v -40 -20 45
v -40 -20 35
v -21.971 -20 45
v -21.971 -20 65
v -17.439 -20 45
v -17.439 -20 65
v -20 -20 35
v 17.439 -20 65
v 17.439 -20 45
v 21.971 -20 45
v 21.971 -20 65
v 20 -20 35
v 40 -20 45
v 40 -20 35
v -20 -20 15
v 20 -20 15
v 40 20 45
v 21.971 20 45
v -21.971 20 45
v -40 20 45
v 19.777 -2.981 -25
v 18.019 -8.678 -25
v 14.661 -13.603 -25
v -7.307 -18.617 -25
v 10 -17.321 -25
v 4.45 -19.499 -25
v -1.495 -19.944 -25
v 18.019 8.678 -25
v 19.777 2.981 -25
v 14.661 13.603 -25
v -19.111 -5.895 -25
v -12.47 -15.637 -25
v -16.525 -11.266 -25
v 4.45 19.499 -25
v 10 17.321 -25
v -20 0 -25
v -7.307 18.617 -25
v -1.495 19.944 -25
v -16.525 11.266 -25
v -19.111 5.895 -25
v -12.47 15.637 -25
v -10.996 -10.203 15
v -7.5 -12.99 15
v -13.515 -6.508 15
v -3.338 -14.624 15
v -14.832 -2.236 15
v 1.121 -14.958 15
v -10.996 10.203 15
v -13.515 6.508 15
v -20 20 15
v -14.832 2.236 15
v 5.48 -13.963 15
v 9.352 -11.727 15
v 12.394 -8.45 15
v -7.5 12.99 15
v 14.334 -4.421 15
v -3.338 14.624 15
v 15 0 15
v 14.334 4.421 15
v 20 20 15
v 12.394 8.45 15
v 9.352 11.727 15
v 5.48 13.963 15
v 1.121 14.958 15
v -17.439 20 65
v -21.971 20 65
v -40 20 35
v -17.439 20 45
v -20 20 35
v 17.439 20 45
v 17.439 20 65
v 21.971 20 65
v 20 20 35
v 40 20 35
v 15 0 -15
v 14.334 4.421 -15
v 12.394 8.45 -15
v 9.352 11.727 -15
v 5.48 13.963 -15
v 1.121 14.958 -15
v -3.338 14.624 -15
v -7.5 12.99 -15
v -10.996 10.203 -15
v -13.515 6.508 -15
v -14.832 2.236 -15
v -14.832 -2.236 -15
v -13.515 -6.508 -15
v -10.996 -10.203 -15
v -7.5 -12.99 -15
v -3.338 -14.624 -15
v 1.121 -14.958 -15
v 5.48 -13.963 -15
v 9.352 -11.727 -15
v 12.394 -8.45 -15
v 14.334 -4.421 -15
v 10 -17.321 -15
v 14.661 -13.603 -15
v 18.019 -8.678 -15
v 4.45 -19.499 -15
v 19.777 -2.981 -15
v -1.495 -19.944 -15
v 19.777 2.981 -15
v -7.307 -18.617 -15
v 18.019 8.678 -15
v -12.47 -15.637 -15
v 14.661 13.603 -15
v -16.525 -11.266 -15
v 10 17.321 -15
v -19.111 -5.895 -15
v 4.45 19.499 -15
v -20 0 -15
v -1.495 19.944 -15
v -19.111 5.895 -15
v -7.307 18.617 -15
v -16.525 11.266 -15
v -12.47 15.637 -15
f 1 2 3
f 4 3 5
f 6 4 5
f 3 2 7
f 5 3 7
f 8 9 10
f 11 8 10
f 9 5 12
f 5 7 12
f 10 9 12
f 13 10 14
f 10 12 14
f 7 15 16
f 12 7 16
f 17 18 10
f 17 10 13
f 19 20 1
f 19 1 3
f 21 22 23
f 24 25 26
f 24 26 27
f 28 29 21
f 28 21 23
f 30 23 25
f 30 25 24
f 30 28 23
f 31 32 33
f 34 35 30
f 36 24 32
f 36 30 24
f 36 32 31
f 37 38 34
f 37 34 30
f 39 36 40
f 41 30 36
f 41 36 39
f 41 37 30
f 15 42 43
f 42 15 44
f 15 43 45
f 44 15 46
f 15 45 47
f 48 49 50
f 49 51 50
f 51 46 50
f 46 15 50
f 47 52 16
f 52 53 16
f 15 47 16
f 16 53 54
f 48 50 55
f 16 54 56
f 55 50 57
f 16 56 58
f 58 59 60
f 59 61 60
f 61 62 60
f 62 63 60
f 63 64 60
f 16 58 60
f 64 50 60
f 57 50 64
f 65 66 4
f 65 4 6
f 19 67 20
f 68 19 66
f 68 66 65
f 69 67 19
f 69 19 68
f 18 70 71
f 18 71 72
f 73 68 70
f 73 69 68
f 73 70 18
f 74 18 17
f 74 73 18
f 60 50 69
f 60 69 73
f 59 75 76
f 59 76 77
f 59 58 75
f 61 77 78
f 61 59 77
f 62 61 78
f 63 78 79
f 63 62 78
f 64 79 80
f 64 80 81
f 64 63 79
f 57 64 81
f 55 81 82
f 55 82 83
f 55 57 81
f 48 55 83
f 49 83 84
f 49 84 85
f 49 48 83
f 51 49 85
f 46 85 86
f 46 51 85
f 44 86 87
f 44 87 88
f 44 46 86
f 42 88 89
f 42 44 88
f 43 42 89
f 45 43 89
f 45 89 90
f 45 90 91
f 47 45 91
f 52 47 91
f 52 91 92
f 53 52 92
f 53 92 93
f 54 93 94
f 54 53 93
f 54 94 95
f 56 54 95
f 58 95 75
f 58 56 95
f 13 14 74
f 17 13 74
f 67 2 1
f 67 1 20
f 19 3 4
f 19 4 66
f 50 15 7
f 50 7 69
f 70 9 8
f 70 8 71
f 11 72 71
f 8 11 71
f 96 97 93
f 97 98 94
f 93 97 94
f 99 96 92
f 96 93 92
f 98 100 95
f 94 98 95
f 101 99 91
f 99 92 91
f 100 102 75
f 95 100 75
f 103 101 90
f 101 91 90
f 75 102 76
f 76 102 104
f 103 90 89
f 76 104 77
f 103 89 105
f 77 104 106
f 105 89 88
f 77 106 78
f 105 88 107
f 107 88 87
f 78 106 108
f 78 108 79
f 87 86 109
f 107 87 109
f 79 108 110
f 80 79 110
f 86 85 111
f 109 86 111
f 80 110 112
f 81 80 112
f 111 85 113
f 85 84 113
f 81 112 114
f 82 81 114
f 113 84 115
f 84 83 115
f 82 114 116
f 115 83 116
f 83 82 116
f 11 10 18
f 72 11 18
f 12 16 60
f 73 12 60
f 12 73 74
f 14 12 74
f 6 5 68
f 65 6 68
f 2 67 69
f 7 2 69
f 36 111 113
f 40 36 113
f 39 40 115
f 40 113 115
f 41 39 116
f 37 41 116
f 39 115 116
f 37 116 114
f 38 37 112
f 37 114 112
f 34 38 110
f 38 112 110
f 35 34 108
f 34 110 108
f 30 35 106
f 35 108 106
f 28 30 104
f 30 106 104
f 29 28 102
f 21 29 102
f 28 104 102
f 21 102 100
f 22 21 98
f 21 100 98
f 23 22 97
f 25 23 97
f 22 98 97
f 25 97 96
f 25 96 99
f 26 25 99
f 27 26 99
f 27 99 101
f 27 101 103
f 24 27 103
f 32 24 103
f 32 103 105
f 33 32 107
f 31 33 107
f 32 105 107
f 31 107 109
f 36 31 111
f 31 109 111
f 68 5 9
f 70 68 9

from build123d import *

# Parameters (mm, degrees)
SKETCH1_R           = 15
BOSS_EXTRUDE1_DEPTH = 15
SKETCH2_R           = 20
BOSS_EXTRUDE2_DEPTH = 10
SKETCH3_W           = 40
SKETCH3_H           = 40
BOSS_EXTRUDE3_DEPTH = 20
SKETCH4_W           = 80
SKETCH4_H           = 40
BOSS_EXTRUDE4_DEPTH = 10
SKETCH5_W           = 4.531505326
SKETCH5_H           = 40
BOSS_EXTRUDE5_DEPTH = 20


with BuildPart() as part:
    # Sketch1 → Boss-Extrude1 (new, symmetric)
    with BuildSketch(Plane.XY):
        Circle(SKETCH1_R)
    extrude(amount=BOSS_EXTRUDE1_DEPTH, both=True)

    # Sketch2 → Boss-Extrude2 (add)
    with BuildSketch(Plane(origin=(0, 0, -15), x_dir=(-1, 0, 0), z_dir=(0, 0, -1))):
        Circle(SKETCH2_R)
    extrude(amount=BOSS_EXTRUDE2_DEPTH)

    # Sketch3 → Boss-Extrude3 (add)
    with BuildSketch(Plane.XY.offset(15)):
        Rectangle(SKETCH3_W, SKETCH3_H)
    extrude(amount=BOSS_EXTRUDE3_DEPTH)

    # Sketch4 → Boss-Extrude4 (add)
    with BuildSketch(Plane.XY.offset(35)):
        Rectangle(SKETCH4_W, SKETCH4_H)
    extrude(amount=BOSS_EXTRUDE4_DEPTH)

    # Sketch5 → Boss-Extrude5 (add)
    with BuildSketch(Plane.XY.offset(45)):
        with Locations((-19.705182252, 0)):
            Rectangle(SKETCH5_W, SKETCH5_H)
    boss_extrude5 = extrude(amount=BOSS_EXTRUDE5_DEPTH)

    # Mirror1: Boss-Extrude5 across plane
    add(boss_extrude5.mirror(Plane(origin=(0, 0, 0), x_dir=(0, 0, 1), z_dir=(1, 0, 0))))


solid = part.part
